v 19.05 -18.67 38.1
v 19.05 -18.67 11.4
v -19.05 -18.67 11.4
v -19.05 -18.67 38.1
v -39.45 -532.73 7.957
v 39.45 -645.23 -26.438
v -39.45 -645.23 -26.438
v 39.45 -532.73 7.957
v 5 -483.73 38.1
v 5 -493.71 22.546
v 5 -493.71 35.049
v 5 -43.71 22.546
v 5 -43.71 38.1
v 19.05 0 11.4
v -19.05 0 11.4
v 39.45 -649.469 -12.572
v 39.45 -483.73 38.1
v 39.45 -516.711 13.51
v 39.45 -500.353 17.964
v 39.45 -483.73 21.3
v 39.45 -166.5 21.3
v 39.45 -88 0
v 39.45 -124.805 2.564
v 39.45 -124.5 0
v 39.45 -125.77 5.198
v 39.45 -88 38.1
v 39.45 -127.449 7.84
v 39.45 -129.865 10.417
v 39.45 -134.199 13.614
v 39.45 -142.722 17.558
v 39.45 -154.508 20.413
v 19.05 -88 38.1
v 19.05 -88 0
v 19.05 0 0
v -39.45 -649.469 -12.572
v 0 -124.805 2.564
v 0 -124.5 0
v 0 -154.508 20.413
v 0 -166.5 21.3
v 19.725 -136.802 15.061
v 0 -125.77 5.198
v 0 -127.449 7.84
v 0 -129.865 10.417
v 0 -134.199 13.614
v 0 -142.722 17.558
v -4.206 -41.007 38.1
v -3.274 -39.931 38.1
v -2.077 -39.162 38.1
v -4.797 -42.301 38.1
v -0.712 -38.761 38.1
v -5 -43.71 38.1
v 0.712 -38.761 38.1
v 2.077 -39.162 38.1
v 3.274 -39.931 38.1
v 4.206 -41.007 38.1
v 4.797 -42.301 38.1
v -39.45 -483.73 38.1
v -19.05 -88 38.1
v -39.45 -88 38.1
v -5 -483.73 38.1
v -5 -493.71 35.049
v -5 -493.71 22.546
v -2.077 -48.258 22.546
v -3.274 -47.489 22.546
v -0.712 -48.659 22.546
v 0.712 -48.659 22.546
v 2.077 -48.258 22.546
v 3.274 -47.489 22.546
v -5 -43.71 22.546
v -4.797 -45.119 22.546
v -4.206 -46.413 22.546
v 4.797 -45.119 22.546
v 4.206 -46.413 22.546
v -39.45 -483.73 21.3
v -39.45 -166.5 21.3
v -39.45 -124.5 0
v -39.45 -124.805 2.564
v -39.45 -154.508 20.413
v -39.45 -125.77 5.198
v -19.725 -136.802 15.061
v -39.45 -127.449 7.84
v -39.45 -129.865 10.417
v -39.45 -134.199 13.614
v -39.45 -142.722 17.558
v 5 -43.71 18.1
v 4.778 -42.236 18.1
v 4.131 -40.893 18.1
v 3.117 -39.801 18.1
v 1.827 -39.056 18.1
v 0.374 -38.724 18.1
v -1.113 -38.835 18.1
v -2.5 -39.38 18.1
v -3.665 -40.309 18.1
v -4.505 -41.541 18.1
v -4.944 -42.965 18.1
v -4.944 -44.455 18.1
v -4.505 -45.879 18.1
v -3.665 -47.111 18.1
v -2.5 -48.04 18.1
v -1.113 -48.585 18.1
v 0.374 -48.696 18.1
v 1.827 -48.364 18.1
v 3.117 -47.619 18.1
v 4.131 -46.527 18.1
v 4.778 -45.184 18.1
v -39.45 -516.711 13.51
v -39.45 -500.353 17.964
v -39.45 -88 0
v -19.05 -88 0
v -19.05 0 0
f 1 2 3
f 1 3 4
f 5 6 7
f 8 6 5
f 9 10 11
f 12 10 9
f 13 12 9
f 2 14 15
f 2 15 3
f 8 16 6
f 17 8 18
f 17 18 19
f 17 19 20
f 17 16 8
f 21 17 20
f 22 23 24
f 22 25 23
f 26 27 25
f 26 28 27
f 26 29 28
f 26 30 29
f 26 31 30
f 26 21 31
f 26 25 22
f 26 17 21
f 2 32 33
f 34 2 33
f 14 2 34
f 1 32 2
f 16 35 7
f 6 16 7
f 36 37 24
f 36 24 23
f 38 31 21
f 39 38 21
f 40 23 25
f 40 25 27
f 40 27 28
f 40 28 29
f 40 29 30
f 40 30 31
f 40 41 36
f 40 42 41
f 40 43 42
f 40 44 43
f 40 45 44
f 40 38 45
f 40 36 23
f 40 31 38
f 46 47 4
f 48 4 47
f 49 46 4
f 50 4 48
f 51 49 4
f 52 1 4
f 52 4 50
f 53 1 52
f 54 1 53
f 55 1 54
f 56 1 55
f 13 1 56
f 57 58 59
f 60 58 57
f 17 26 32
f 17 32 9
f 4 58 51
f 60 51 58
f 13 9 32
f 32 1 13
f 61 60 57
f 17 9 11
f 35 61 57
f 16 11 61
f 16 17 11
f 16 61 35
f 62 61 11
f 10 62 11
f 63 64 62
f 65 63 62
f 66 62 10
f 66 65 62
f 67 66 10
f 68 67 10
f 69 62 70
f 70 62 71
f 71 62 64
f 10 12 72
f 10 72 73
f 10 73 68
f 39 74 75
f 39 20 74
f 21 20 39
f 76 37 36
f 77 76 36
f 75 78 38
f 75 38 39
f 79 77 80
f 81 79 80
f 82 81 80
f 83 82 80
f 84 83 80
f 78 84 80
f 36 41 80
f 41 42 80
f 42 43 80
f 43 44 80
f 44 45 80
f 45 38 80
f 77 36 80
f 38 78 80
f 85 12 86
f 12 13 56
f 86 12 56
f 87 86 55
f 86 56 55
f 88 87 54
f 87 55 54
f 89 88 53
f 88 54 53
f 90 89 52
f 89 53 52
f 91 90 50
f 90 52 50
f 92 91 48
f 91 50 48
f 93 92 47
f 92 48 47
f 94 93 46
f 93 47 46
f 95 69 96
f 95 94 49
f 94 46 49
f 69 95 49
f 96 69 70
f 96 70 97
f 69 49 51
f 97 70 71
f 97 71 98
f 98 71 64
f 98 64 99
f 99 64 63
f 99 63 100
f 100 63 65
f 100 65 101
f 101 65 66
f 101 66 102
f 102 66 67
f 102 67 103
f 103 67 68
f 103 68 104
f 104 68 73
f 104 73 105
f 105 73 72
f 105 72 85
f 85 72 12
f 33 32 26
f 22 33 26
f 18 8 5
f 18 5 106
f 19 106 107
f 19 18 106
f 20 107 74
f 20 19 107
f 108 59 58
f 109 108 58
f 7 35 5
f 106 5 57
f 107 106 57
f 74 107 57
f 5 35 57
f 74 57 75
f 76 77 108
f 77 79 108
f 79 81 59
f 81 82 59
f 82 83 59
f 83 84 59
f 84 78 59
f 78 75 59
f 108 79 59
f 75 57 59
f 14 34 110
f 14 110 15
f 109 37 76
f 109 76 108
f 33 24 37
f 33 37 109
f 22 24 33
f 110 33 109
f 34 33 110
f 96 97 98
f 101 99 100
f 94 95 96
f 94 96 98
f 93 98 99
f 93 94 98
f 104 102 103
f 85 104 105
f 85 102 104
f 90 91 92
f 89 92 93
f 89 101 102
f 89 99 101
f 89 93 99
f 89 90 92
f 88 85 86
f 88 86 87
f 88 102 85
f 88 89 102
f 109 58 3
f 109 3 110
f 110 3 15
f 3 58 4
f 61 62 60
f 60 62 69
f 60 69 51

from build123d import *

# Parameters (mm, degrees)
F1_DEPTH  = 39.45
F2_W      = 36.9970819473
F2_H      = 107.2933008075
F10_DEPTH = 64.5390001
F3_R      = 5
F4_DEPTH  = 20
F6_W      = 10
F6_H      = 31.76
F7_DEPTH  = 450


with BuildPart() as f1:
    # F0 (on Right) → F1 (new body, symmetric)
    with BuildSketch(Plane.YZ):
        with BuildLine():
            Line((-124.5, 0), (0, 0))
            Line((0, 0), (0, 11.4))
            Line((0, 11.4), (-18.67, 11.4))
            Line((-18.67, 11.4), (-18.67, 38.1))
            Line((-18.67, 38.1), (-483.73, 38.1))
            Line((-483.73, 38.1), (-649.4693797859, -12.5716135265))
            Line((-649.4693797859, -12.5716135265), (-645.23, -26.438))
            Line((-645.23, -26.438), (-532.73, 7.9567016641))
            ThreePointArc((-532.73, 7.9567016641), (-508.5696932883, 15.8757913603), (-483.73, 21.3))
            Line((-483.73, 21.3), (-425.73, 21.3))
            Line((-425.73, 21.3), (-166.5, 21.3))
            add(Edge.make_bspline(
                [(-124.5, 0), (-124.5, 21.3), (-166.5, 21.3)],
                knots=[0, 0, 0, 1.5707963268, 1.5707963268, 1.5707963268], degree=2, weights=[1, 0.7071067812, 1]))
        make_face()
    extrude(amount=F1_DEPTH, both=True)

    # F2 (on face) → F10 (cut, through all)
    with BuildSketch(Plane.XY.offset(38.1)):
        with Locations((37.5485409737, -34.3533495963)):
            Rectangle(F2_W, F2_H)
        with Locations((-37.5485409737, -34.3533495963)):
            Rectangle(F2_W, F2_H)
    extrude(amount=-F10_DEPTH, mode=Mode.SUBTRACT)

    # F3 (on face) → F4 (cut)
    with BuildSketch(Plane.XY.offset(38.1)):
        with Locations((0, -43.71)):
            Circle(F3_R)
    extrude(amount=-F4_DEPTH, mode=Mode.SUBTRACT)

    # F6 (on plane+point) → F7 (cut)
    with BuildSketch(Plane.XZ.offset(43.71)):
        with Locations((0, 38.4264938357)):
            Rectangle(F6_W, F6_H)
    extrude(amount=F7_DEPTH, mode=Mode.SUBTRACT)


solid = f1.part
